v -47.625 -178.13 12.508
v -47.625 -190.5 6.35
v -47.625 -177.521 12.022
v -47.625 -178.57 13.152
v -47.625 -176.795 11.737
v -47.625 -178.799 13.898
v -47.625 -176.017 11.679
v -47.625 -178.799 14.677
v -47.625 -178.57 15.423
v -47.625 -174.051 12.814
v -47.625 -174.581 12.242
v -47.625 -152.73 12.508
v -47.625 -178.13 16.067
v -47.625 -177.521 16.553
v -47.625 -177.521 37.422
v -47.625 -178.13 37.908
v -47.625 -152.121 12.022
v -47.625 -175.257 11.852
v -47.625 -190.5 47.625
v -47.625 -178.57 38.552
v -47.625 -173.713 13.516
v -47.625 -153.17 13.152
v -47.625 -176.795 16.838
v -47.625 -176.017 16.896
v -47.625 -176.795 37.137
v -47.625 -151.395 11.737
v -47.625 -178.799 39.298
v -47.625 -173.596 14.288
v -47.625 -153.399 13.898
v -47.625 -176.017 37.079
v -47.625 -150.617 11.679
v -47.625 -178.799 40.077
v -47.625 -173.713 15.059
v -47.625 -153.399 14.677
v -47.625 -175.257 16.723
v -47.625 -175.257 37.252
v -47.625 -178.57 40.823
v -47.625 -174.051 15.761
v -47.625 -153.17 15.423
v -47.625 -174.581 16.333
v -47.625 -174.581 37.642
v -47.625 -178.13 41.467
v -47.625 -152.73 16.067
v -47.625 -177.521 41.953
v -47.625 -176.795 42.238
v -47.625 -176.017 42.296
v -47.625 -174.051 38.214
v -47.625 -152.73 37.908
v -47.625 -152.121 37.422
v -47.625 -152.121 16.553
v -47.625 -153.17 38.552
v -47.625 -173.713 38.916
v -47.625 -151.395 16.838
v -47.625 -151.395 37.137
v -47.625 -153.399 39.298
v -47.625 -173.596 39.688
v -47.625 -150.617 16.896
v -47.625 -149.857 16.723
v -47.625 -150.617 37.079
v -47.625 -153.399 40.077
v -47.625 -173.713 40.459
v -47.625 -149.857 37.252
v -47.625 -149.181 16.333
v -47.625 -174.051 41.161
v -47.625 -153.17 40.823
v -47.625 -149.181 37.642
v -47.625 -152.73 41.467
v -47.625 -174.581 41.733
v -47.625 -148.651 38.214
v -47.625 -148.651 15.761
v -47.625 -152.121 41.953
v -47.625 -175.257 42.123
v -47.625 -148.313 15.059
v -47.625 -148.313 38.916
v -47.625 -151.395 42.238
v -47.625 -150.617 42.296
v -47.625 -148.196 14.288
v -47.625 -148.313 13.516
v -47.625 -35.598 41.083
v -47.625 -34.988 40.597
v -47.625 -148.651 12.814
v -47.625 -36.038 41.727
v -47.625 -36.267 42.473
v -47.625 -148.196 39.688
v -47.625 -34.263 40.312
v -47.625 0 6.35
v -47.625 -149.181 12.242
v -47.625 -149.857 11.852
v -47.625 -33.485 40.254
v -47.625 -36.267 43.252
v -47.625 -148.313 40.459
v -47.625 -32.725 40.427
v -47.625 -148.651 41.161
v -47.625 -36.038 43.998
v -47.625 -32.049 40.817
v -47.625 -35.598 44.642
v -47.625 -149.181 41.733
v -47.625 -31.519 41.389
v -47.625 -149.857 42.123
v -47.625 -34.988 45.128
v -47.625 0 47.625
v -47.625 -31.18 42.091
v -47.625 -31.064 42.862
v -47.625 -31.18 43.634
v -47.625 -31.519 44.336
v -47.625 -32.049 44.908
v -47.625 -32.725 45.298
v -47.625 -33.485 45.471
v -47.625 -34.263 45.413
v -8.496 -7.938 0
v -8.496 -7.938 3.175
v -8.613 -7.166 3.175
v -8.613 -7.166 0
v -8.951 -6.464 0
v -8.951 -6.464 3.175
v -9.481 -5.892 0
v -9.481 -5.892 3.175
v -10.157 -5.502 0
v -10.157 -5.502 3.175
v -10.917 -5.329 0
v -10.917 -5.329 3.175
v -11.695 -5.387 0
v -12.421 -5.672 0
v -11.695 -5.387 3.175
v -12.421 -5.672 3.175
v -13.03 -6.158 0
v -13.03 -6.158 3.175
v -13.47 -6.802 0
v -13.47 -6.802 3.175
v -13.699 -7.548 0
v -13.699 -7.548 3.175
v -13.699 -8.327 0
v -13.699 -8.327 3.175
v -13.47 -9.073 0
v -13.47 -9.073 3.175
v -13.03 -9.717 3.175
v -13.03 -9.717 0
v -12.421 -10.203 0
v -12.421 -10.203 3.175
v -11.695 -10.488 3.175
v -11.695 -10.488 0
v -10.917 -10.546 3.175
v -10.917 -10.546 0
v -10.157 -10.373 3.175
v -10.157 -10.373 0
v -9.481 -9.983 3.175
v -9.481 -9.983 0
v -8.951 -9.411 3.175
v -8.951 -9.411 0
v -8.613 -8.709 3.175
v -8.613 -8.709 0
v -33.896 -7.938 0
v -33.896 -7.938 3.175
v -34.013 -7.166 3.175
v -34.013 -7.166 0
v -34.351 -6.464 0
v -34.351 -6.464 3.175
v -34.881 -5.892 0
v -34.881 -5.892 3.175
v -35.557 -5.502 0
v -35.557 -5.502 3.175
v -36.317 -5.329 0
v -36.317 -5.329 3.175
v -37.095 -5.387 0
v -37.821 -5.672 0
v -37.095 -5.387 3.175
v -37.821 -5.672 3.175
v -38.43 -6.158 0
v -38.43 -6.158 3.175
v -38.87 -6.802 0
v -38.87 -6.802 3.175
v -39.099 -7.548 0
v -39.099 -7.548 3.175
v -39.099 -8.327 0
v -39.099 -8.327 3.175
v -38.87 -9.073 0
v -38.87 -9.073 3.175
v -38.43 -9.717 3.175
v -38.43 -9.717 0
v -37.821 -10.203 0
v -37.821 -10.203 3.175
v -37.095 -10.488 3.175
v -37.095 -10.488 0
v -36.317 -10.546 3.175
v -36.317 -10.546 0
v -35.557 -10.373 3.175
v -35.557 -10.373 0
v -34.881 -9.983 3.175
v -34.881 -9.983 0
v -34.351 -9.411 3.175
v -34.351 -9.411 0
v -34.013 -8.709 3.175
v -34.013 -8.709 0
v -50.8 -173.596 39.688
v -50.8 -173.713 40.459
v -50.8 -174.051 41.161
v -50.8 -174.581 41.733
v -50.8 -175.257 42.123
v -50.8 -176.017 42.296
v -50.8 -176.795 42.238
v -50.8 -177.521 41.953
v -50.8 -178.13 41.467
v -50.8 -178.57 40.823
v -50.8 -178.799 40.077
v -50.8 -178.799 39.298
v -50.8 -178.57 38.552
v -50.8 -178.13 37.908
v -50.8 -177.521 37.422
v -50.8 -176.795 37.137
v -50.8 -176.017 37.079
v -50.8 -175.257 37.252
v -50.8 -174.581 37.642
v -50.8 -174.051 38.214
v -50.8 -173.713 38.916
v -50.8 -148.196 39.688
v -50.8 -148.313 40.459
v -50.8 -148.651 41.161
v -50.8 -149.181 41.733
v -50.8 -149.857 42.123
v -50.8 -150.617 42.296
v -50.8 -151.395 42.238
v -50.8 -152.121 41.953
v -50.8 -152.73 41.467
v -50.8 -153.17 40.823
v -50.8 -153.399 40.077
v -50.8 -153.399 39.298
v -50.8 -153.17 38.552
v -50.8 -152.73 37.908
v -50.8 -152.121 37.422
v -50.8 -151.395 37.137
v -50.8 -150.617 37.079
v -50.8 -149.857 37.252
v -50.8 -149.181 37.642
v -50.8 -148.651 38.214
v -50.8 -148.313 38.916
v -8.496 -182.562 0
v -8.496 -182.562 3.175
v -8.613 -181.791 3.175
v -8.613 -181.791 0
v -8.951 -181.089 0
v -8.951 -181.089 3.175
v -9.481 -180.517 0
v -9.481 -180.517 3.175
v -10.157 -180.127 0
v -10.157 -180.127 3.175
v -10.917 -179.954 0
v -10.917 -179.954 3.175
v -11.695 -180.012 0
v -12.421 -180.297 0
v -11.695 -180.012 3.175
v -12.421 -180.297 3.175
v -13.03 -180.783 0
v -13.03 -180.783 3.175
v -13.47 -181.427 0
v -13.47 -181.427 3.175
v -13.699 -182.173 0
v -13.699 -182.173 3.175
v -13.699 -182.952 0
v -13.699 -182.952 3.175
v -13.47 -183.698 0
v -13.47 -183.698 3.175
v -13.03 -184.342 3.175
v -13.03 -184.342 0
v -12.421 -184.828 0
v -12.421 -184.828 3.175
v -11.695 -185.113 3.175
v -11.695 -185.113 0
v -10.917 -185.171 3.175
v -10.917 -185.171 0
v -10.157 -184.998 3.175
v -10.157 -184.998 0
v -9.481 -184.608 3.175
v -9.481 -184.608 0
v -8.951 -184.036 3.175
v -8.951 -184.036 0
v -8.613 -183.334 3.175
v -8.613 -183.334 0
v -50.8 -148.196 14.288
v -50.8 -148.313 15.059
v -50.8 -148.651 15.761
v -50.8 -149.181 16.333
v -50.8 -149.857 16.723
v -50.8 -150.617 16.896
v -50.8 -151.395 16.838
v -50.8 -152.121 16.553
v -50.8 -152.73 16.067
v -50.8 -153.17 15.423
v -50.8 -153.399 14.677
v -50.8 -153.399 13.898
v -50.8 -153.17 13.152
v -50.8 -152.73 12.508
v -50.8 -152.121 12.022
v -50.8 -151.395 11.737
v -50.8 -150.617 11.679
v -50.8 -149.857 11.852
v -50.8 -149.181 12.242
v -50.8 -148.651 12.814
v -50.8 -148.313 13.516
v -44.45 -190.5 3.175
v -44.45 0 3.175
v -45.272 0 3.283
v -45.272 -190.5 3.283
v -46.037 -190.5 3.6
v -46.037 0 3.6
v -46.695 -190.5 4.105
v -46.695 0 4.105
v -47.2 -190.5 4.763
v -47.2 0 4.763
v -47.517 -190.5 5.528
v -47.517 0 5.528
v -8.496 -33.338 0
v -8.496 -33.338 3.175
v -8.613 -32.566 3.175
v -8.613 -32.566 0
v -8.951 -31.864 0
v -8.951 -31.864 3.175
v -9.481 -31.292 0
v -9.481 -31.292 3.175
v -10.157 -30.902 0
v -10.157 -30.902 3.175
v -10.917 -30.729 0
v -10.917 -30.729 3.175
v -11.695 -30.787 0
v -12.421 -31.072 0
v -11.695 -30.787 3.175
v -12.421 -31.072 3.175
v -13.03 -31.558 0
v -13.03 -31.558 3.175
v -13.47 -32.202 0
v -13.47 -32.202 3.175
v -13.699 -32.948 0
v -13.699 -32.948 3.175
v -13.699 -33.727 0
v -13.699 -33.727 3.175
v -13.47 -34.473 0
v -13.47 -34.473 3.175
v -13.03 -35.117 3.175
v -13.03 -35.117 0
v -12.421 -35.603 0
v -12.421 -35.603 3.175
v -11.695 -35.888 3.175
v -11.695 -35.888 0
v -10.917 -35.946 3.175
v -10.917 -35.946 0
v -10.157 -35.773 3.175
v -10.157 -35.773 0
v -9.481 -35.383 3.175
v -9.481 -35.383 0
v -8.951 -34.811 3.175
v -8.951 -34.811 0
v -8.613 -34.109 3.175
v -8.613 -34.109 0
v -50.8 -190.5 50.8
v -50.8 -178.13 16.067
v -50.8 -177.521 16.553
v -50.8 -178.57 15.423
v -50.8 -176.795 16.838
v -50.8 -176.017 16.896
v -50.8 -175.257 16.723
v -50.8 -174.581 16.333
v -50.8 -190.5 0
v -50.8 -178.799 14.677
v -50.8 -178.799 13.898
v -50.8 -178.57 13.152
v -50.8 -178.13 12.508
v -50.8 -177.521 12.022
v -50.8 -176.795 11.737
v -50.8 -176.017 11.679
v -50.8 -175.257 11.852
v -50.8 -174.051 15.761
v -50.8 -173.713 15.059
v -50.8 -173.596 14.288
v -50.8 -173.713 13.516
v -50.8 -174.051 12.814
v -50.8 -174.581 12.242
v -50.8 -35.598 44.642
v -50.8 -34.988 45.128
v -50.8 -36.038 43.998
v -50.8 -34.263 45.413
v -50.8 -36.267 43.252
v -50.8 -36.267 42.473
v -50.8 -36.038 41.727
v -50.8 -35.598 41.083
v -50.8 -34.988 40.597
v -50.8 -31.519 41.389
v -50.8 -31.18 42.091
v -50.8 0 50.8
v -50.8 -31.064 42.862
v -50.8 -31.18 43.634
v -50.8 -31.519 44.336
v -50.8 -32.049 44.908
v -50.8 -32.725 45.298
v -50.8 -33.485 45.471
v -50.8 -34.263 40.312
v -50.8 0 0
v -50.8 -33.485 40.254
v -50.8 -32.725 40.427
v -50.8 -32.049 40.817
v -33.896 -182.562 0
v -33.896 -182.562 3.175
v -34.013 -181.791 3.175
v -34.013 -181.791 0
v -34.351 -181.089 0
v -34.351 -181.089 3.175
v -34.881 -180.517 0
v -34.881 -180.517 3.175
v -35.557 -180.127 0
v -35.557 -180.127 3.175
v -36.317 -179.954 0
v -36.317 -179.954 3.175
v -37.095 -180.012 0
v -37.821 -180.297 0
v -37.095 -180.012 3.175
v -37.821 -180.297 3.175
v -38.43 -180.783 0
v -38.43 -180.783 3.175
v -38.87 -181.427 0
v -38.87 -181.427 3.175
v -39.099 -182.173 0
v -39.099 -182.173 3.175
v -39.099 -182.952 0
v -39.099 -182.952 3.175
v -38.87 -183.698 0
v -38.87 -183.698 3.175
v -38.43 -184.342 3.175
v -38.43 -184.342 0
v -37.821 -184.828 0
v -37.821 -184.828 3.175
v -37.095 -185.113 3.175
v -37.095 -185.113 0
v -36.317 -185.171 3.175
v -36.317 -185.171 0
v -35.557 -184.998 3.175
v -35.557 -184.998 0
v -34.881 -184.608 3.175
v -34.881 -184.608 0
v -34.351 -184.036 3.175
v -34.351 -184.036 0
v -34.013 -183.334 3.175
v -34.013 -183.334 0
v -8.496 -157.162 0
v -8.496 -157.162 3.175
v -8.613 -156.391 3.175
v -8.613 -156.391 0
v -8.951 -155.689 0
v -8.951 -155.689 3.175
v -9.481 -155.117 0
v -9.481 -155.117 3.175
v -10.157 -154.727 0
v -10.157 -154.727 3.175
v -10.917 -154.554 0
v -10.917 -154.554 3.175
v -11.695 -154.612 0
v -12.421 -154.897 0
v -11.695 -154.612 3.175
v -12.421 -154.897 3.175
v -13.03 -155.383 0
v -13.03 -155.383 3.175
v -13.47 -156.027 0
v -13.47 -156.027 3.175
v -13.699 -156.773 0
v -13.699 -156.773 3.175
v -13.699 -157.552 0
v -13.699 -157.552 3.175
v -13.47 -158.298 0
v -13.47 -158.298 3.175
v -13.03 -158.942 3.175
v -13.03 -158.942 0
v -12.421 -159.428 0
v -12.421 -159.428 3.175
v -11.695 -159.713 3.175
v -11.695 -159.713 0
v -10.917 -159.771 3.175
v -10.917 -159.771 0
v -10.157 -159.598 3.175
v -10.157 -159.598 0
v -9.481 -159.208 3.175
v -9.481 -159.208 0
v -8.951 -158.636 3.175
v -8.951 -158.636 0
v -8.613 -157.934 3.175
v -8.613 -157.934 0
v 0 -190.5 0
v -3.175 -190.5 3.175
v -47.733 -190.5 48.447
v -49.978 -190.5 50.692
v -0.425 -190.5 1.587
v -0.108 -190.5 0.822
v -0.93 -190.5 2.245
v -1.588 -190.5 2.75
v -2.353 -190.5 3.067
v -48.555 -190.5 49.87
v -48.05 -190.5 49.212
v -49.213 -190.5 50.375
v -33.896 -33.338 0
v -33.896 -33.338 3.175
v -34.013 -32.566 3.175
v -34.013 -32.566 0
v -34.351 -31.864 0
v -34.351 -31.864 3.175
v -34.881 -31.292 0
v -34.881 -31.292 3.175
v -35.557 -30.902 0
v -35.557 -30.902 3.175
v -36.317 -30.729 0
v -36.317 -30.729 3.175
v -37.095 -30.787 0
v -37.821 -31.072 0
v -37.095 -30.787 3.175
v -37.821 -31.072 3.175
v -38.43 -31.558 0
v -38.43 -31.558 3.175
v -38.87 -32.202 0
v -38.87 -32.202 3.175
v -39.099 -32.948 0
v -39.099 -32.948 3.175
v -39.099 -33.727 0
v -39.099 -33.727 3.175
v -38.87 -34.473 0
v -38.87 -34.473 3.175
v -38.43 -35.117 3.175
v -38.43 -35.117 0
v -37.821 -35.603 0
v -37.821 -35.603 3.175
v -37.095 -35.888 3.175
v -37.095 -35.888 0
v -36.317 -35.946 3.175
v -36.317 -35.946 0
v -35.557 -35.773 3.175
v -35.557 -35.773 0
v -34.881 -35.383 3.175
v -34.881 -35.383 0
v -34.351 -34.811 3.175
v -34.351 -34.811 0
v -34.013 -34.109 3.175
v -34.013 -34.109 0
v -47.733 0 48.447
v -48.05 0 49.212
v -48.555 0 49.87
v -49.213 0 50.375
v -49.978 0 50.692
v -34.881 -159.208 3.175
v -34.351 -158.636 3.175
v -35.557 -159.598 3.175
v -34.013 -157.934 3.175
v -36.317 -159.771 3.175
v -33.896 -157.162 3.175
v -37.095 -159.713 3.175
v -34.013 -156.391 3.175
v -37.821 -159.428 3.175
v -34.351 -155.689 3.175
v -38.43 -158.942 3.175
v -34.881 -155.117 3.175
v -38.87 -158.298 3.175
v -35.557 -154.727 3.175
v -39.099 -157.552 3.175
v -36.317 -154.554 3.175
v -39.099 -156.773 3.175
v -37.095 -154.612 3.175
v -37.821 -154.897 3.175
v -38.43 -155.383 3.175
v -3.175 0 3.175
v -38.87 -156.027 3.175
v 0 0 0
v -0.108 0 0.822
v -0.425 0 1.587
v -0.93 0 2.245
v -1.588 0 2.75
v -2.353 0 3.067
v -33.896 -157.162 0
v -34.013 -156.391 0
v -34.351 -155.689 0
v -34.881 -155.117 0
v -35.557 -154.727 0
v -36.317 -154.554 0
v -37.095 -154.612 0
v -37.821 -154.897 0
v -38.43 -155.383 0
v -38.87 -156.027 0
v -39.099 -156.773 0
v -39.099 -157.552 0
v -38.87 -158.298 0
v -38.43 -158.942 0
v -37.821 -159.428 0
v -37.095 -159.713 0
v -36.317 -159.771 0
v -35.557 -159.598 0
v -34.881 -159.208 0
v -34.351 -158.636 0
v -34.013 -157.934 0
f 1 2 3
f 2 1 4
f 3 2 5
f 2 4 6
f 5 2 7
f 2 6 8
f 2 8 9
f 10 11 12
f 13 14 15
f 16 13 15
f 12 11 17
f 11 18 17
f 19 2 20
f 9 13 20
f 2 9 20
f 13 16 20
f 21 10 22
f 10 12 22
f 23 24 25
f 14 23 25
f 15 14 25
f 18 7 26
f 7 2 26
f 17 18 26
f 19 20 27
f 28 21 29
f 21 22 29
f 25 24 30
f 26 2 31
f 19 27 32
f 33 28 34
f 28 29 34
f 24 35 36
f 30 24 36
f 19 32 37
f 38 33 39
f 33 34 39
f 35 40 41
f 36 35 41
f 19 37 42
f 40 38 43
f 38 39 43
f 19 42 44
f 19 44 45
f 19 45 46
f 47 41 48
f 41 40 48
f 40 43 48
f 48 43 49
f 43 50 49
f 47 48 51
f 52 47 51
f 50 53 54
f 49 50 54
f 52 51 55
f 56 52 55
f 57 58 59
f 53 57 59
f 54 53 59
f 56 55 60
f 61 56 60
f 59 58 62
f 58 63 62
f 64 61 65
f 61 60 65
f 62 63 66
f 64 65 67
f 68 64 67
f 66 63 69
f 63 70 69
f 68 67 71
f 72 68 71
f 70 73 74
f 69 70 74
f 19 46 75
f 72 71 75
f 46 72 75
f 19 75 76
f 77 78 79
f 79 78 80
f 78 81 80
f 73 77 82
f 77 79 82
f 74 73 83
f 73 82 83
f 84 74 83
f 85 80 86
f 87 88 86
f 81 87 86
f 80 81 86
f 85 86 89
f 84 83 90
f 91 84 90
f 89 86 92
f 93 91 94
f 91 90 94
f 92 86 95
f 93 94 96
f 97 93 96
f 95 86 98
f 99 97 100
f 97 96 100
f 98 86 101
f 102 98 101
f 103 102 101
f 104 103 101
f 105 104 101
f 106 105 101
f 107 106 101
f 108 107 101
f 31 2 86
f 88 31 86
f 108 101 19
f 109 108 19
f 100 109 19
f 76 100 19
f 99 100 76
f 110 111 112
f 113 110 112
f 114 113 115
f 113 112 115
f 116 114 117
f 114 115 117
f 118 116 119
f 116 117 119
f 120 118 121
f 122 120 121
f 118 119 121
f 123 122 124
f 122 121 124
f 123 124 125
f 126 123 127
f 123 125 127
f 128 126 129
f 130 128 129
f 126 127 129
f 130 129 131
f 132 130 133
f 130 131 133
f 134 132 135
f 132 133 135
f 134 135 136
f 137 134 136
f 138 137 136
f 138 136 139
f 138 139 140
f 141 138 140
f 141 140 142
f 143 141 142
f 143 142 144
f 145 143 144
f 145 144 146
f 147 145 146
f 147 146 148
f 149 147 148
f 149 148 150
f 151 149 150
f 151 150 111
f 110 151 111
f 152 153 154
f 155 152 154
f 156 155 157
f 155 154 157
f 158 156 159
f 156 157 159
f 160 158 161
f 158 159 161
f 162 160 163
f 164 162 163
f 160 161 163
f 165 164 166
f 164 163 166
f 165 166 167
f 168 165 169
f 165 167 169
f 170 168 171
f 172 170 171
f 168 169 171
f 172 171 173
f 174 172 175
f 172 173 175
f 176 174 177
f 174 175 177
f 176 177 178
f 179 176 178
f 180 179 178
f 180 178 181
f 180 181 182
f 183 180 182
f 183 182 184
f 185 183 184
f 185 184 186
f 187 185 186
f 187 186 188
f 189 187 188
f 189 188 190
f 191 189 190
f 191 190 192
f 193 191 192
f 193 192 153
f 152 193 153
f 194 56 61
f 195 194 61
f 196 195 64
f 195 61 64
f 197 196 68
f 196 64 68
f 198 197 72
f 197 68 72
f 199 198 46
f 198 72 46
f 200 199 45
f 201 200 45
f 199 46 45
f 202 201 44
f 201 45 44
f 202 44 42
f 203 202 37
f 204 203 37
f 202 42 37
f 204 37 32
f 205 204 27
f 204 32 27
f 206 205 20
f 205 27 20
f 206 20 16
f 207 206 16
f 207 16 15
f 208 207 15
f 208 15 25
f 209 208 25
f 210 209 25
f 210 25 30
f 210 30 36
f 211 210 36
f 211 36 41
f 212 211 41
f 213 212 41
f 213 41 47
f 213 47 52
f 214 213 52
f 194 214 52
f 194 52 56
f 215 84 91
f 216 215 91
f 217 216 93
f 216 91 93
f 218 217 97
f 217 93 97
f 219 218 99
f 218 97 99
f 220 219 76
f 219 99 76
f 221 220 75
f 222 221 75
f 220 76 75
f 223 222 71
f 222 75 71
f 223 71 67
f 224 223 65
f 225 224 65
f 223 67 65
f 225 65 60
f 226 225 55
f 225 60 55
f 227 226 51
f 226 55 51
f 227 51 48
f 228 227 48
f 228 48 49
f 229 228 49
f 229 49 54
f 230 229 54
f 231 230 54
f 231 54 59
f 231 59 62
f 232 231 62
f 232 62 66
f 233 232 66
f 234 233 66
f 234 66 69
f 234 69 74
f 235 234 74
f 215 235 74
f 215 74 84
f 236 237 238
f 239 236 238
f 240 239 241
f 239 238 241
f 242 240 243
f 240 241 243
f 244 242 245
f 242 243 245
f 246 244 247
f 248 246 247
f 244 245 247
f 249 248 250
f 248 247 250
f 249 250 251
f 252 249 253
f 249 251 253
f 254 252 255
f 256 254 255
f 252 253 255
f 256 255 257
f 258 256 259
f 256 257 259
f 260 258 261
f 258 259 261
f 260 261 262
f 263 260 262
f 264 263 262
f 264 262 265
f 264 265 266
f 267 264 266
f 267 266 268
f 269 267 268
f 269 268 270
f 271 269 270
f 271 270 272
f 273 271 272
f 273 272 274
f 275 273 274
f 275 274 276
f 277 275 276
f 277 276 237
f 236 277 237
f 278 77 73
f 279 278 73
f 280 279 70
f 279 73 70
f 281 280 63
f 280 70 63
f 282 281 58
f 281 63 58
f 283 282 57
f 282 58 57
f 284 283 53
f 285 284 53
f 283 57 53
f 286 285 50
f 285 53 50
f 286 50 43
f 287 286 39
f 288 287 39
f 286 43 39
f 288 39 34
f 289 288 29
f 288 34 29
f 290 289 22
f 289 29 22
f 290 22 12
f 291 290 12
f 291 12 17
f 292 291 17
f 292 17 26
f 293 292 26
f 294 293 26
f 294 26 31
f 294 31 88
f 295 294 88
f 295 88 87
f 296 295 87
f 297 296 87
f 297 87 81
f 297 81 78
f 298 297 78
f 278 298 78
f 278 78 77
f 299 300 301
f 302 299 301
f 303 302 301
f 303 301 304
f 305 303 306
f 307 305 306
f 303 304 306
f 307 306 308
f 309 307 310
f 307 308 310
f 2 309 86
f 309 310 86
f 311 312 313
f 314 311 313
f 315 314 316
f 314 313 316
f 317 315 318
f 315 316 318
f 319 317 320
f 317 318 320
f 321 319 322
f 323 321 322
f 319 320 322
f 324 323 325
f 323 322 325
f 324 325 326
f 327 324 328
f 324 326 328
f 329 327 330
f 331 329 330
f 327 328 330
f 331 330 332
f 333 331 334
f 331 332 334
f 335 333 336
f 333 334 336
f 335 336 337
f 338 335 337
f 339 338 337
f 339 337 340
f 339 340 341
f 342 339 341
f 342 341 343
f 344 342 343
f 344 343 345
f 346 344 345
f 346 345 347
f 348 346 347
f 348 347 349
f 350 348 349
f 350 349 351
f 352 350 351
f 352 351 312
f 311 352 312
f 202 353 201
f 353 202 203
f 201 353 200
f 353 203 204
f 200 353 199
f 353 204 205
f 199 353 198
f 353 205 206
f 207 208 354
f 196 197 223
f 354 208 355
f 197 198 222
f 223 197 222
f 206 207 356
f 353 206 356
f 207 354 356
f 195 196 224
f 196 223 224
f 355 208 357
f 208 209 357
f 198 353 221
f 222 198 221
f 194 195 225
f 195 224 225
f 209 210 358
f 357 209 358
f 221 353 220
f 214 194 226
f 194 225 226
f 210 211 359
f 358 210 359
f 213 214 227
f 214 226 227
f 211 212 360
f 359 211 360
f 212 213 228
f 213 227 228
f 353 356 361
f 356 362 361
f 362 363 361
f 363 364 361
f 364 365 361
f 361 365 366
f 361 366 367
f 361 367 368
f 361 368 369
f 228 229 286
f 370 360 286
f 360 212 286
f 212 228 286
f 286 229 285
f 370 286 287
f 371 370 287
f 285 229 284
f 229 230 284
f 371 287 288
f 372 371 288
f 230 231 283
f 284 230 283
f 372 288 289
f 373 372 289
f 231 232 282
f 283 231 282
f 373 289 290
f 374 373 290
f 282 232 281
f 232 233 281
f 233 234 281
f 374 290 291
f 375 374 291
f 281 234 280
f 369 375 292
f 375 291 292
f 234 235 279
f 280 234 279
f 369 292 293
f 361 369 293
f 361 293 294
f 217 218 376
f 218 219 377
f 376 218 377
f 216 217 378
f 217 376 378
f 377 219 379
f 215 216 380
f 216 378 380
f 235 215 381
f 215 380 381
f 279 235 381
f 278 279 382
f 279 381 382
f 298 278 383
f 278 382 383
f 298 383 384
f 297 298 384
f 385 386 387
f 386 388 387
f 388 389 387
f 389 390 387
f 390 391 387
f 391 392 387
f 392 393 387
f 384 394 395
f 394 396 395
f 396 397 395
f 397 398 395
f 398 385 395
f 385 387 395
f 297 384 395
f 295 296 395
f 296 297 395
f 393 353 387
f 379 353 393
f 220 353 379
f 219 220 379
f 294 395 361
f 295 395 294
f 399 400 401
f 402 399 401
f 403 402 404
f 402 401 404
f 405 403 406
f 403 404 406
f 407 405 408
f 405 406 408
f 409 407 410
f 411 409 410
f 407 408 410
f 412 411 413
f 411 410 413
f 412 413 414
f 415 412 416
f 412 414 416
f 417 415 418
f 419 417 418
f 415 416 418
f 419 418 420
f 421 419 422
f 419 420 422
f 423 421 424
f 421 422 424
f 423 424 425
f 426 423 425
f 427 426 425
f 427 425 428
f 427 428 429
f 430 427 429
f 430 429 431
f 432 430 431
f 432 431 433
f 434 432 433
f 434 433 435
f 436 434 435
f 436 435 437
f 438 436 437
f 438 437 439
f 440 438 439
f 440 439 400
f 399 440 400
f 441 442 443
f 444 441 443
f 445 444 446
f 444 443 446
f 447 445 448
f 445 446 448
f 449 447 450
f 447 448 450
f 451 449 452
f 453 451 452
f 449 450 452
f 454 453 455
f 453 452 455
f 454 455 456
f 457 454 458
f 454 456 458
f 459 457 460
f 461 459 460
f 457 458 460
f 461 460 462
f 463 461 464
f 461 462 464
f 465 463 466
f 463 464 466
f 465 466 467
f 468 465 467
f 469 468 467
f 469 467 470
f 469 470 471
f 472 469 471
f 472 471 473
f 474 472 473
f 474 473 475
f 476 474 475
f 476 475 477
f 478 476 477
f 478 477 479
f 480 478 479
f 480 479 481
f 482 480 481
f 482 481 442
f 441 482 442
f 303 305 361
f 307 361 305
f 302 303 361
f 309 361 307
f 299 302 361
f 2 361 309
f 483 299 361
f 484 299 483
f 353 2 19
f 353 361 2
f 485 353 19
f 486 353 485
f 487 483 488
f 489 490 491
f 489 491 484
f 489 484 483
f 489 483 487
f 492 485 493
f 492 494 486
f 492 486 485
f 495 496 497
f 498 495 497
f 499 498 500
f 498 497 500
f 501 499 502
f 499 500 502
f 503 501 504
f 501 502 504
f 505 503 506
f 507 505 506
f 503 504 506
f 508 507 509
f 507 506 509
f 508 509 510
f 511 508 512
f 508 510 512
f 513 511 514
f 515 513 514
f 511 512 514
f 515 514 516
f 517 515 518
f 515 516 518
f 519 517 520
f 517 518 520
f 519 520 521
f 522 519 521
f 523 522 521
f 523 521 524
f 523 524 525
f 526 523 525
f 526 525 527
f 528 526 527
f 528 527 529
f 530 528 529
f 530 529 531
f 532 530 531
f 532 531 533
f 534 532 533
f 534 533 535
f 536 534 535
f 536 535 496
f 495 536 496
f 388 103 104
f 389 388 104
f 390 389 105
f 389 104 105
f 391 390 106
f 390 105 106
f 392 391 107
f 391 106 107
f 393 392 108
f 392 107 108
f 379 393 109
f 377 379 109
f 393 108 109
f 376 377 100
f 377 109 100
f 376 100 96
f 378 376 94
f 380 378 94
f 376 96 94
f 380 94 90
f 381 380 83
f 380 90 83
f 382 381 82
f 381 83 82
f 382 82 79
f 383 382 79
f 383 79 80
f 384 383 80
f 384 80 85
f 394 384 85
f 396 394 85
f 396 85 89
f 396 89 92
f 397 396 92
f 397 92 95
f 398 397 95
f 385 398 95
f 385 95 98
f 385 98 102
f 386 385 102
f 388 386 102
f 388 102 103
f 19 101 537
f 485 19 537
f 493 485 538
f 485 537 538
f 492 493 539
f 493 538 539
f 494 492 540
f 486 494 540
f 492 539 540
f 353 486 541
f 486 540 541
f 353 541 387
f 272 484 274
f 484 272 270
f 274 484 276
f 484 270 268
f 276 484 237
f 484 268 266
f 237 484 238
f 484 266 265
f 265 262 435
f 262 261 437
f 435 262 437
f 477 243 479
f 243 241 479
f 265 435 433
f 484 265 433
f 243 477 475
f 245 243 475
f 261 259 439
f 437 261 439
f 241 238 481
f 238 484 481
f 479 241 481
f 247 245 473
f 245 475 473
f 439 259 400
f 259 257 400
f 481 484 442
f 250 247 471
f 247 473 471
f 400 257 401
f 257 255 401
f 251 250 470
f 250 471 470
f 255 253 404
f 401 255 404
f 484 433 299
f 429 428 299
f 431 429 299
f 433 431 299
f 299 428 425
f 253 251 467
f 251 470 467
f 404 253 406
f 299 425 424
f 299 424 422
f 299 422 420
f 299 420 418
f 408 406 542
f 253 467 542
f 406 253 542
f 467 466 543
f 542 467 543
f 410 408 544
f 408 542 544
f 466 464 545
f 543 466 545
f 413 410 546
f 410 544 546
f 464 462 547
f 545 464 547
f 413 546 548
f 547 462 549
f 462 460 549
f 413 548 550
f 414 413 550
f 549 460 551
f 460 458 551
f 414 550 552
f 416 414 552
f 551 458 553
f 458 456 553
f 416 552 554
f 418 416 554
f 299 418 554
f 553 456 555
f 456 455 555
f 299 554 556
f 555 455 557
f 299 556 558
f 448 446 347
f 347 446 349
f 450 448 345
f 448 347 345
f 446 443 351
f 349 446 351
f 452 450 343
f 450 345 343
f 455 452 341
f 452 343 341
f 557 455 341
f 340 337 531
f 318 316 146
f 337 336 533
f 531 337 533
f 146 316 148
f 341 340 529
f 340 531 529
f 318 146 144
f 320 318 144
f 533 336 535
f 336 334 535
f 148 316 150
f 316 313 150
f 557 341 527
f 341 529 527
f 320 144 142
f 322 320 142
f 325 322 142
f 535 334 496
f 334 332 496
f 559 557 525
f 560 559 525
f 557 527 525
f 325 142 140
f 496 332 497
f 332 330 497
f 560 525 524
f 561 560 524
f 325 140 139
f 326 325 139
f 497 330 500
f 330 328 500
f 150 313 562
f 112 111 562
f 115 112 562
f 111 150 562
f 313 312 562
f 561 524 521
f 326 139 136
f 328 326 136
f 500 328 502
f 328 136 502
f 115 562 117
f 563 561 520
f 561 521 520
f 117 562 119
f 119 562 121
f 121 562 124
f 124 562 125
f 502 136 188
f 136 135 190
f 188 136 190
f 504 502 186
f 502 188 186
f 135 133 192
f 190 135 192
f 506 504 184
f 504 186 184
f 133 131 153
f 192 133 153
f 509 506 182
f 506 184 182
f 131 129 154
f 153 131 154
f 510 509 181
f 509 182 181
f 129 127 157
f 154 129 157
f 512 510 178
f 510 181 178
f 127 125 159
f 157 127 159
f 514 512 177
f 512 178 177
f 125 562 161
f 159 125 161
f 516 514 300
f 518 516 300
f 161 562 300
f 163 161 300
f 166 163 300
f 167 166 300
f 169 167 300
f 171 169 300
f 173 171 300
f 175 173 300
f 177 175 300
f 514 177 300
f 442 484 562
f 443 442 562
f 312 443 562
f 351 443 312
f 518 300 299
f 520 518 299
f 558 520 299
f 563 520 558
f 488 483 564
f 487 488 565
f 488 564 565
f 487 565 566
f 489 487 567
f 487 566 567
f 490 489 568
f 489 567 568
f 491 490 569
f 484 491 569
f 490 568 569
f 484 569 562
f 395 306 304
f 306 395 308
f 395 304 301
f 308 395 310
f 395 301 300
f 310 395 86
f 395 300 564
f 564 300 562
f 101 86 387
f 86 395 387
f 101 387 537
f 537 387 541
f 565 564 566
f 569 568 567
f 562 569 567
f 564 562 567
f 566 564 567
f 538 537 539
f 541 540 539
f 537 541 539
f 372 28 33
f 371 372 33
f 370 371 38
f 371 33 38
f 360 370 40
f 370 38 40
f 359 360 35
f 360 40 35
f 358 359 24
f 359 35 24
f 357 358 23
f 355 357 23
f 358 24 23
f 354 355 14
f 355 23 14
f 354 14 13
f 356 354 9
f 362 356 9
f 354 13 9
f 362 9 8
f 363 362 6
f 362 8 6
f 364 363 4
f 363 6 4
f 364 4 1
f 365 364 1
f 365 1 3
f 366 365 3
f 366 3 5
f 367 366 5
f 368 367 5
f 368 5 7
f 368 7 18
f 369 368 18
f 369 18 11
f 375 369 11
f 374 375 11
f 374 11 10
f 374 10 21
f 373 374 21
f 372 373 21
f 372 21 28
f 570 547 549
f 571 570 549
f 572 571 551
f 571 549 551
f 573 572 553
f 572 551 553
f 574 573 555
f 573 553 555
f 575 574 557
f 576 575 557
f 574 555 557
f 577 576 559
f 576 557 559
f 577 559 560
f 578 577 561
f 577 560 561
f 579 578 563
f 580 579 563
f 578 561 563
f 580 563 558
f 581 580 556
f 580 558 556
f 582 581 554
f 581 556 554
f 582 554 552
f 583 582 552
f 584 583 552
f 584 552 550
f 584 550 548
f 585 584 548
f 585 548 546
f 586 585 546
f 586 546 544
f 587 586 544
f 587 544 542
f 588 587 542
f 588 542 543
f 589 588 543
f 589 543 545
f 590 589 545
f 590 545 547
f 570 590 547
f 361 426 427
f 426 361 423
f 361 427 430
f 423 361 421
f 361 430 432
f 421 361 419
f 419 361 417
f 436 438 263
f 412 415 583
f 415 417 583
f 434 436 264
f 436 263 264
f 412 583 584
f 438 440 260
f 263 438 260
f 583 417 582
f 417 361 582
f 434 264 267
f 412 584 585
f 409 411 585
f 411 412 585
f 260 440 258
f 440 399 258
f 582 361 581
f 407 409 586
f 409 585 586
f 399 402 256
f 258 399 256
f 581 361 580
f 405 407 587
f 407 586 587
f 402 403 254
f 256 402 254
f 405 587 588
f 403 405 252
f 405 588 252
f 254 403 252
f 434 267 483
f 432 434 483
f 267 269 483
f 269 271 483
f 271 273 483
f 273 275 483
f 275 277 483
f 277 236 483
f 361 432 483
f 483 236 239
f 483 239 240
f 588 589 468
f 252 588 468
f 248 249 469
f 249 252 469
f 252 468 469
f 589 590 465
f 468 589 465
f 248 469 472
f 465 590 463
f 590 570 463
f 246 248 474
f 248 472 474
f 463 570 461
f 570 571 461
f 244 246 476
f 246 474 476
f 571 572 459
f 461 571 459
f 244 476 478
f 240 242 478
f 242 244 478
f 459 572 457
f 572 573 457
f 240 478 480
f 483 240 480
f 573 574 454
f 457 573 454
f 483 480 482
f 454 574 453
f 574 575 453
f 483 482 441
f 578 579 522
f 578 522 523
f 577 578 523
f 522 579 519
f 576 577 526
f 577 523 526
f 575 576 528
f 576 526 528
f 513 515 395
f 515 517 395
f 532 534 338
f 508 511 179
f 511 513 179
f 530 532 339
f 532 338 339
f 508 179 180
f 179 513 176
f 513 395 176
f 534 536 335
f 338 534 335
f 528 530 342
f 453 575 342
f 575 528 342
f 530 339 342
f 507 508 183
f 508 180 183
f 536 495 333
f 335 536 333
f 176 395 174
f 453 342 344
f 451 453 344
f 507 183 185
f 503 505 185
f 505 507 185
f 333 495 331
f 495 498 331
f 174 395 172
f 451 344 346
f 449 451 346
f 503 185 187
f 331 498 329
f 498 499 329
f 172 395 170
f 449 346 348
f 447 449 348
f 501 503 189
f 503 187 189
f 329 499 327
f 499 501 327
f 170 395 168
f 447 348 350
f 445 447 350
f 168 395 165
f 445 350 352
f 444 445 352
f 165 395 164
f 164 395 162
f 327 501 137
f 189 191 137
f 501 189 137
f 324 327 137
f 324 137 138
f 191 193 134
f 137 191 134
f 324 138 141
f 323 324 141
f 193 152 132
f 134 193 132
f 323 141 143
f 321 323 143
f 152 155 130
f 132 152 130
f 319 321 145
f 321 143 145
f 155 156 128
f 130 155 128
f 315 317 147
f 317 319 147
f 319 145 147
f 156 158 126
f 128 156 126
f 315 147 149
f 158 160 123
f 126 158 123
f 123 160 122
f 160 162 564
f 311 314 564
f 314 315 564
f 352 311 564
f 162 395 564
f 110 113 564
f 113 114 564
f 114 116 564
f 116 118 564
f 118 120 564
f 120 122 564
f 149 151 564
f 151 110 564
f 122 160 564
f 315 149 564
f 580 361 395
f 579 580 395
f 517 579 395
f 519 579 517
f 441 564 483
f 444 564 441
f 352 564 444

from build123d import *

# Parameters (mm, degrees)
F1_DEPTH = 190.5
F2_R     = 2.6162
F3_DEPTH = 3.176
F4_R     = 2.6162
F5_DEPTH = 3.176


with BuildPart() as f1:
    # F0 (on Front) → F1 (new body)
    with BuildSketch(Plane.XZ):
        with BuildLine():
            Line((-50.8, 0), (0, 0))
            ThreePointArc((0, 0), (-0.929936, 2.245064), (-3.175, 3.175))
            Line((-3.175, 3.175), (-44.45, 3.175))
            ThreePointArc((-44.45, 3.175), (-46.695064, 4.104936), (-47.625, 6.35))
            Line((-47.625, 6.35), (-47.625, 47.625))
            ThreePointArc((-47.625, 47.625), (-48.554936, 49.870064), (-50.8, 50.8))
            Line((-50.8, 50.8), (-50.8, 0))
        make_face()
    extrude(amount=F1_DEPTH)

    # F2 (on face) → F3 (cut, through all)
    with BuildSketch(Plane.YZ.offset(-47.625)):
        with Locations((-176.2125, 14.2875)):
            Circle(F2_R)
        with Locations((-176.2125, 39.6875)):
            Circle(F2_R)
        with Locations((-150.8125, 39.6875)):
            Circle(F2_R)
        with Locations((-150.8125, 14.2875)):
            Circle(F2_R)
        with Locations((-33.6804, 42.8625)):
            Circle(F2_R)
    extrude(amount=-F3_DEPTH, mode=Mode.SUBTRACT)

    # F4 (on face) → F5 (cut, through all)
    with BuildSketch(Plane.XY.offset(3.175)):
        with Locations((-36.5125, -182.5625)):
            Circle(F4_R)
        with Locations((-36.5125, -7.9375)):
            Circle(F4_R)
        with Locations((-11.1125, -7.9375)):
            Circle(F4_R)
        with Locations((-36.5125, -33.3375)):
            Circle(F4_R)
        with Locations((-11.1125, -33.3375)):
            Circle(F4_R)
        with Locations((-36.5125, -157.1625)):
            Circle(F4_R)
        with Locations((-11.1125, -182.5625)):
            Circle(F4_R)
        with Locations((-11.1125, -157.1625)):
            Circle(F4_R)
    extrude(amount=-F5_DEPTH, mode=Mode.SUBTRACT)


solid = f1.part
